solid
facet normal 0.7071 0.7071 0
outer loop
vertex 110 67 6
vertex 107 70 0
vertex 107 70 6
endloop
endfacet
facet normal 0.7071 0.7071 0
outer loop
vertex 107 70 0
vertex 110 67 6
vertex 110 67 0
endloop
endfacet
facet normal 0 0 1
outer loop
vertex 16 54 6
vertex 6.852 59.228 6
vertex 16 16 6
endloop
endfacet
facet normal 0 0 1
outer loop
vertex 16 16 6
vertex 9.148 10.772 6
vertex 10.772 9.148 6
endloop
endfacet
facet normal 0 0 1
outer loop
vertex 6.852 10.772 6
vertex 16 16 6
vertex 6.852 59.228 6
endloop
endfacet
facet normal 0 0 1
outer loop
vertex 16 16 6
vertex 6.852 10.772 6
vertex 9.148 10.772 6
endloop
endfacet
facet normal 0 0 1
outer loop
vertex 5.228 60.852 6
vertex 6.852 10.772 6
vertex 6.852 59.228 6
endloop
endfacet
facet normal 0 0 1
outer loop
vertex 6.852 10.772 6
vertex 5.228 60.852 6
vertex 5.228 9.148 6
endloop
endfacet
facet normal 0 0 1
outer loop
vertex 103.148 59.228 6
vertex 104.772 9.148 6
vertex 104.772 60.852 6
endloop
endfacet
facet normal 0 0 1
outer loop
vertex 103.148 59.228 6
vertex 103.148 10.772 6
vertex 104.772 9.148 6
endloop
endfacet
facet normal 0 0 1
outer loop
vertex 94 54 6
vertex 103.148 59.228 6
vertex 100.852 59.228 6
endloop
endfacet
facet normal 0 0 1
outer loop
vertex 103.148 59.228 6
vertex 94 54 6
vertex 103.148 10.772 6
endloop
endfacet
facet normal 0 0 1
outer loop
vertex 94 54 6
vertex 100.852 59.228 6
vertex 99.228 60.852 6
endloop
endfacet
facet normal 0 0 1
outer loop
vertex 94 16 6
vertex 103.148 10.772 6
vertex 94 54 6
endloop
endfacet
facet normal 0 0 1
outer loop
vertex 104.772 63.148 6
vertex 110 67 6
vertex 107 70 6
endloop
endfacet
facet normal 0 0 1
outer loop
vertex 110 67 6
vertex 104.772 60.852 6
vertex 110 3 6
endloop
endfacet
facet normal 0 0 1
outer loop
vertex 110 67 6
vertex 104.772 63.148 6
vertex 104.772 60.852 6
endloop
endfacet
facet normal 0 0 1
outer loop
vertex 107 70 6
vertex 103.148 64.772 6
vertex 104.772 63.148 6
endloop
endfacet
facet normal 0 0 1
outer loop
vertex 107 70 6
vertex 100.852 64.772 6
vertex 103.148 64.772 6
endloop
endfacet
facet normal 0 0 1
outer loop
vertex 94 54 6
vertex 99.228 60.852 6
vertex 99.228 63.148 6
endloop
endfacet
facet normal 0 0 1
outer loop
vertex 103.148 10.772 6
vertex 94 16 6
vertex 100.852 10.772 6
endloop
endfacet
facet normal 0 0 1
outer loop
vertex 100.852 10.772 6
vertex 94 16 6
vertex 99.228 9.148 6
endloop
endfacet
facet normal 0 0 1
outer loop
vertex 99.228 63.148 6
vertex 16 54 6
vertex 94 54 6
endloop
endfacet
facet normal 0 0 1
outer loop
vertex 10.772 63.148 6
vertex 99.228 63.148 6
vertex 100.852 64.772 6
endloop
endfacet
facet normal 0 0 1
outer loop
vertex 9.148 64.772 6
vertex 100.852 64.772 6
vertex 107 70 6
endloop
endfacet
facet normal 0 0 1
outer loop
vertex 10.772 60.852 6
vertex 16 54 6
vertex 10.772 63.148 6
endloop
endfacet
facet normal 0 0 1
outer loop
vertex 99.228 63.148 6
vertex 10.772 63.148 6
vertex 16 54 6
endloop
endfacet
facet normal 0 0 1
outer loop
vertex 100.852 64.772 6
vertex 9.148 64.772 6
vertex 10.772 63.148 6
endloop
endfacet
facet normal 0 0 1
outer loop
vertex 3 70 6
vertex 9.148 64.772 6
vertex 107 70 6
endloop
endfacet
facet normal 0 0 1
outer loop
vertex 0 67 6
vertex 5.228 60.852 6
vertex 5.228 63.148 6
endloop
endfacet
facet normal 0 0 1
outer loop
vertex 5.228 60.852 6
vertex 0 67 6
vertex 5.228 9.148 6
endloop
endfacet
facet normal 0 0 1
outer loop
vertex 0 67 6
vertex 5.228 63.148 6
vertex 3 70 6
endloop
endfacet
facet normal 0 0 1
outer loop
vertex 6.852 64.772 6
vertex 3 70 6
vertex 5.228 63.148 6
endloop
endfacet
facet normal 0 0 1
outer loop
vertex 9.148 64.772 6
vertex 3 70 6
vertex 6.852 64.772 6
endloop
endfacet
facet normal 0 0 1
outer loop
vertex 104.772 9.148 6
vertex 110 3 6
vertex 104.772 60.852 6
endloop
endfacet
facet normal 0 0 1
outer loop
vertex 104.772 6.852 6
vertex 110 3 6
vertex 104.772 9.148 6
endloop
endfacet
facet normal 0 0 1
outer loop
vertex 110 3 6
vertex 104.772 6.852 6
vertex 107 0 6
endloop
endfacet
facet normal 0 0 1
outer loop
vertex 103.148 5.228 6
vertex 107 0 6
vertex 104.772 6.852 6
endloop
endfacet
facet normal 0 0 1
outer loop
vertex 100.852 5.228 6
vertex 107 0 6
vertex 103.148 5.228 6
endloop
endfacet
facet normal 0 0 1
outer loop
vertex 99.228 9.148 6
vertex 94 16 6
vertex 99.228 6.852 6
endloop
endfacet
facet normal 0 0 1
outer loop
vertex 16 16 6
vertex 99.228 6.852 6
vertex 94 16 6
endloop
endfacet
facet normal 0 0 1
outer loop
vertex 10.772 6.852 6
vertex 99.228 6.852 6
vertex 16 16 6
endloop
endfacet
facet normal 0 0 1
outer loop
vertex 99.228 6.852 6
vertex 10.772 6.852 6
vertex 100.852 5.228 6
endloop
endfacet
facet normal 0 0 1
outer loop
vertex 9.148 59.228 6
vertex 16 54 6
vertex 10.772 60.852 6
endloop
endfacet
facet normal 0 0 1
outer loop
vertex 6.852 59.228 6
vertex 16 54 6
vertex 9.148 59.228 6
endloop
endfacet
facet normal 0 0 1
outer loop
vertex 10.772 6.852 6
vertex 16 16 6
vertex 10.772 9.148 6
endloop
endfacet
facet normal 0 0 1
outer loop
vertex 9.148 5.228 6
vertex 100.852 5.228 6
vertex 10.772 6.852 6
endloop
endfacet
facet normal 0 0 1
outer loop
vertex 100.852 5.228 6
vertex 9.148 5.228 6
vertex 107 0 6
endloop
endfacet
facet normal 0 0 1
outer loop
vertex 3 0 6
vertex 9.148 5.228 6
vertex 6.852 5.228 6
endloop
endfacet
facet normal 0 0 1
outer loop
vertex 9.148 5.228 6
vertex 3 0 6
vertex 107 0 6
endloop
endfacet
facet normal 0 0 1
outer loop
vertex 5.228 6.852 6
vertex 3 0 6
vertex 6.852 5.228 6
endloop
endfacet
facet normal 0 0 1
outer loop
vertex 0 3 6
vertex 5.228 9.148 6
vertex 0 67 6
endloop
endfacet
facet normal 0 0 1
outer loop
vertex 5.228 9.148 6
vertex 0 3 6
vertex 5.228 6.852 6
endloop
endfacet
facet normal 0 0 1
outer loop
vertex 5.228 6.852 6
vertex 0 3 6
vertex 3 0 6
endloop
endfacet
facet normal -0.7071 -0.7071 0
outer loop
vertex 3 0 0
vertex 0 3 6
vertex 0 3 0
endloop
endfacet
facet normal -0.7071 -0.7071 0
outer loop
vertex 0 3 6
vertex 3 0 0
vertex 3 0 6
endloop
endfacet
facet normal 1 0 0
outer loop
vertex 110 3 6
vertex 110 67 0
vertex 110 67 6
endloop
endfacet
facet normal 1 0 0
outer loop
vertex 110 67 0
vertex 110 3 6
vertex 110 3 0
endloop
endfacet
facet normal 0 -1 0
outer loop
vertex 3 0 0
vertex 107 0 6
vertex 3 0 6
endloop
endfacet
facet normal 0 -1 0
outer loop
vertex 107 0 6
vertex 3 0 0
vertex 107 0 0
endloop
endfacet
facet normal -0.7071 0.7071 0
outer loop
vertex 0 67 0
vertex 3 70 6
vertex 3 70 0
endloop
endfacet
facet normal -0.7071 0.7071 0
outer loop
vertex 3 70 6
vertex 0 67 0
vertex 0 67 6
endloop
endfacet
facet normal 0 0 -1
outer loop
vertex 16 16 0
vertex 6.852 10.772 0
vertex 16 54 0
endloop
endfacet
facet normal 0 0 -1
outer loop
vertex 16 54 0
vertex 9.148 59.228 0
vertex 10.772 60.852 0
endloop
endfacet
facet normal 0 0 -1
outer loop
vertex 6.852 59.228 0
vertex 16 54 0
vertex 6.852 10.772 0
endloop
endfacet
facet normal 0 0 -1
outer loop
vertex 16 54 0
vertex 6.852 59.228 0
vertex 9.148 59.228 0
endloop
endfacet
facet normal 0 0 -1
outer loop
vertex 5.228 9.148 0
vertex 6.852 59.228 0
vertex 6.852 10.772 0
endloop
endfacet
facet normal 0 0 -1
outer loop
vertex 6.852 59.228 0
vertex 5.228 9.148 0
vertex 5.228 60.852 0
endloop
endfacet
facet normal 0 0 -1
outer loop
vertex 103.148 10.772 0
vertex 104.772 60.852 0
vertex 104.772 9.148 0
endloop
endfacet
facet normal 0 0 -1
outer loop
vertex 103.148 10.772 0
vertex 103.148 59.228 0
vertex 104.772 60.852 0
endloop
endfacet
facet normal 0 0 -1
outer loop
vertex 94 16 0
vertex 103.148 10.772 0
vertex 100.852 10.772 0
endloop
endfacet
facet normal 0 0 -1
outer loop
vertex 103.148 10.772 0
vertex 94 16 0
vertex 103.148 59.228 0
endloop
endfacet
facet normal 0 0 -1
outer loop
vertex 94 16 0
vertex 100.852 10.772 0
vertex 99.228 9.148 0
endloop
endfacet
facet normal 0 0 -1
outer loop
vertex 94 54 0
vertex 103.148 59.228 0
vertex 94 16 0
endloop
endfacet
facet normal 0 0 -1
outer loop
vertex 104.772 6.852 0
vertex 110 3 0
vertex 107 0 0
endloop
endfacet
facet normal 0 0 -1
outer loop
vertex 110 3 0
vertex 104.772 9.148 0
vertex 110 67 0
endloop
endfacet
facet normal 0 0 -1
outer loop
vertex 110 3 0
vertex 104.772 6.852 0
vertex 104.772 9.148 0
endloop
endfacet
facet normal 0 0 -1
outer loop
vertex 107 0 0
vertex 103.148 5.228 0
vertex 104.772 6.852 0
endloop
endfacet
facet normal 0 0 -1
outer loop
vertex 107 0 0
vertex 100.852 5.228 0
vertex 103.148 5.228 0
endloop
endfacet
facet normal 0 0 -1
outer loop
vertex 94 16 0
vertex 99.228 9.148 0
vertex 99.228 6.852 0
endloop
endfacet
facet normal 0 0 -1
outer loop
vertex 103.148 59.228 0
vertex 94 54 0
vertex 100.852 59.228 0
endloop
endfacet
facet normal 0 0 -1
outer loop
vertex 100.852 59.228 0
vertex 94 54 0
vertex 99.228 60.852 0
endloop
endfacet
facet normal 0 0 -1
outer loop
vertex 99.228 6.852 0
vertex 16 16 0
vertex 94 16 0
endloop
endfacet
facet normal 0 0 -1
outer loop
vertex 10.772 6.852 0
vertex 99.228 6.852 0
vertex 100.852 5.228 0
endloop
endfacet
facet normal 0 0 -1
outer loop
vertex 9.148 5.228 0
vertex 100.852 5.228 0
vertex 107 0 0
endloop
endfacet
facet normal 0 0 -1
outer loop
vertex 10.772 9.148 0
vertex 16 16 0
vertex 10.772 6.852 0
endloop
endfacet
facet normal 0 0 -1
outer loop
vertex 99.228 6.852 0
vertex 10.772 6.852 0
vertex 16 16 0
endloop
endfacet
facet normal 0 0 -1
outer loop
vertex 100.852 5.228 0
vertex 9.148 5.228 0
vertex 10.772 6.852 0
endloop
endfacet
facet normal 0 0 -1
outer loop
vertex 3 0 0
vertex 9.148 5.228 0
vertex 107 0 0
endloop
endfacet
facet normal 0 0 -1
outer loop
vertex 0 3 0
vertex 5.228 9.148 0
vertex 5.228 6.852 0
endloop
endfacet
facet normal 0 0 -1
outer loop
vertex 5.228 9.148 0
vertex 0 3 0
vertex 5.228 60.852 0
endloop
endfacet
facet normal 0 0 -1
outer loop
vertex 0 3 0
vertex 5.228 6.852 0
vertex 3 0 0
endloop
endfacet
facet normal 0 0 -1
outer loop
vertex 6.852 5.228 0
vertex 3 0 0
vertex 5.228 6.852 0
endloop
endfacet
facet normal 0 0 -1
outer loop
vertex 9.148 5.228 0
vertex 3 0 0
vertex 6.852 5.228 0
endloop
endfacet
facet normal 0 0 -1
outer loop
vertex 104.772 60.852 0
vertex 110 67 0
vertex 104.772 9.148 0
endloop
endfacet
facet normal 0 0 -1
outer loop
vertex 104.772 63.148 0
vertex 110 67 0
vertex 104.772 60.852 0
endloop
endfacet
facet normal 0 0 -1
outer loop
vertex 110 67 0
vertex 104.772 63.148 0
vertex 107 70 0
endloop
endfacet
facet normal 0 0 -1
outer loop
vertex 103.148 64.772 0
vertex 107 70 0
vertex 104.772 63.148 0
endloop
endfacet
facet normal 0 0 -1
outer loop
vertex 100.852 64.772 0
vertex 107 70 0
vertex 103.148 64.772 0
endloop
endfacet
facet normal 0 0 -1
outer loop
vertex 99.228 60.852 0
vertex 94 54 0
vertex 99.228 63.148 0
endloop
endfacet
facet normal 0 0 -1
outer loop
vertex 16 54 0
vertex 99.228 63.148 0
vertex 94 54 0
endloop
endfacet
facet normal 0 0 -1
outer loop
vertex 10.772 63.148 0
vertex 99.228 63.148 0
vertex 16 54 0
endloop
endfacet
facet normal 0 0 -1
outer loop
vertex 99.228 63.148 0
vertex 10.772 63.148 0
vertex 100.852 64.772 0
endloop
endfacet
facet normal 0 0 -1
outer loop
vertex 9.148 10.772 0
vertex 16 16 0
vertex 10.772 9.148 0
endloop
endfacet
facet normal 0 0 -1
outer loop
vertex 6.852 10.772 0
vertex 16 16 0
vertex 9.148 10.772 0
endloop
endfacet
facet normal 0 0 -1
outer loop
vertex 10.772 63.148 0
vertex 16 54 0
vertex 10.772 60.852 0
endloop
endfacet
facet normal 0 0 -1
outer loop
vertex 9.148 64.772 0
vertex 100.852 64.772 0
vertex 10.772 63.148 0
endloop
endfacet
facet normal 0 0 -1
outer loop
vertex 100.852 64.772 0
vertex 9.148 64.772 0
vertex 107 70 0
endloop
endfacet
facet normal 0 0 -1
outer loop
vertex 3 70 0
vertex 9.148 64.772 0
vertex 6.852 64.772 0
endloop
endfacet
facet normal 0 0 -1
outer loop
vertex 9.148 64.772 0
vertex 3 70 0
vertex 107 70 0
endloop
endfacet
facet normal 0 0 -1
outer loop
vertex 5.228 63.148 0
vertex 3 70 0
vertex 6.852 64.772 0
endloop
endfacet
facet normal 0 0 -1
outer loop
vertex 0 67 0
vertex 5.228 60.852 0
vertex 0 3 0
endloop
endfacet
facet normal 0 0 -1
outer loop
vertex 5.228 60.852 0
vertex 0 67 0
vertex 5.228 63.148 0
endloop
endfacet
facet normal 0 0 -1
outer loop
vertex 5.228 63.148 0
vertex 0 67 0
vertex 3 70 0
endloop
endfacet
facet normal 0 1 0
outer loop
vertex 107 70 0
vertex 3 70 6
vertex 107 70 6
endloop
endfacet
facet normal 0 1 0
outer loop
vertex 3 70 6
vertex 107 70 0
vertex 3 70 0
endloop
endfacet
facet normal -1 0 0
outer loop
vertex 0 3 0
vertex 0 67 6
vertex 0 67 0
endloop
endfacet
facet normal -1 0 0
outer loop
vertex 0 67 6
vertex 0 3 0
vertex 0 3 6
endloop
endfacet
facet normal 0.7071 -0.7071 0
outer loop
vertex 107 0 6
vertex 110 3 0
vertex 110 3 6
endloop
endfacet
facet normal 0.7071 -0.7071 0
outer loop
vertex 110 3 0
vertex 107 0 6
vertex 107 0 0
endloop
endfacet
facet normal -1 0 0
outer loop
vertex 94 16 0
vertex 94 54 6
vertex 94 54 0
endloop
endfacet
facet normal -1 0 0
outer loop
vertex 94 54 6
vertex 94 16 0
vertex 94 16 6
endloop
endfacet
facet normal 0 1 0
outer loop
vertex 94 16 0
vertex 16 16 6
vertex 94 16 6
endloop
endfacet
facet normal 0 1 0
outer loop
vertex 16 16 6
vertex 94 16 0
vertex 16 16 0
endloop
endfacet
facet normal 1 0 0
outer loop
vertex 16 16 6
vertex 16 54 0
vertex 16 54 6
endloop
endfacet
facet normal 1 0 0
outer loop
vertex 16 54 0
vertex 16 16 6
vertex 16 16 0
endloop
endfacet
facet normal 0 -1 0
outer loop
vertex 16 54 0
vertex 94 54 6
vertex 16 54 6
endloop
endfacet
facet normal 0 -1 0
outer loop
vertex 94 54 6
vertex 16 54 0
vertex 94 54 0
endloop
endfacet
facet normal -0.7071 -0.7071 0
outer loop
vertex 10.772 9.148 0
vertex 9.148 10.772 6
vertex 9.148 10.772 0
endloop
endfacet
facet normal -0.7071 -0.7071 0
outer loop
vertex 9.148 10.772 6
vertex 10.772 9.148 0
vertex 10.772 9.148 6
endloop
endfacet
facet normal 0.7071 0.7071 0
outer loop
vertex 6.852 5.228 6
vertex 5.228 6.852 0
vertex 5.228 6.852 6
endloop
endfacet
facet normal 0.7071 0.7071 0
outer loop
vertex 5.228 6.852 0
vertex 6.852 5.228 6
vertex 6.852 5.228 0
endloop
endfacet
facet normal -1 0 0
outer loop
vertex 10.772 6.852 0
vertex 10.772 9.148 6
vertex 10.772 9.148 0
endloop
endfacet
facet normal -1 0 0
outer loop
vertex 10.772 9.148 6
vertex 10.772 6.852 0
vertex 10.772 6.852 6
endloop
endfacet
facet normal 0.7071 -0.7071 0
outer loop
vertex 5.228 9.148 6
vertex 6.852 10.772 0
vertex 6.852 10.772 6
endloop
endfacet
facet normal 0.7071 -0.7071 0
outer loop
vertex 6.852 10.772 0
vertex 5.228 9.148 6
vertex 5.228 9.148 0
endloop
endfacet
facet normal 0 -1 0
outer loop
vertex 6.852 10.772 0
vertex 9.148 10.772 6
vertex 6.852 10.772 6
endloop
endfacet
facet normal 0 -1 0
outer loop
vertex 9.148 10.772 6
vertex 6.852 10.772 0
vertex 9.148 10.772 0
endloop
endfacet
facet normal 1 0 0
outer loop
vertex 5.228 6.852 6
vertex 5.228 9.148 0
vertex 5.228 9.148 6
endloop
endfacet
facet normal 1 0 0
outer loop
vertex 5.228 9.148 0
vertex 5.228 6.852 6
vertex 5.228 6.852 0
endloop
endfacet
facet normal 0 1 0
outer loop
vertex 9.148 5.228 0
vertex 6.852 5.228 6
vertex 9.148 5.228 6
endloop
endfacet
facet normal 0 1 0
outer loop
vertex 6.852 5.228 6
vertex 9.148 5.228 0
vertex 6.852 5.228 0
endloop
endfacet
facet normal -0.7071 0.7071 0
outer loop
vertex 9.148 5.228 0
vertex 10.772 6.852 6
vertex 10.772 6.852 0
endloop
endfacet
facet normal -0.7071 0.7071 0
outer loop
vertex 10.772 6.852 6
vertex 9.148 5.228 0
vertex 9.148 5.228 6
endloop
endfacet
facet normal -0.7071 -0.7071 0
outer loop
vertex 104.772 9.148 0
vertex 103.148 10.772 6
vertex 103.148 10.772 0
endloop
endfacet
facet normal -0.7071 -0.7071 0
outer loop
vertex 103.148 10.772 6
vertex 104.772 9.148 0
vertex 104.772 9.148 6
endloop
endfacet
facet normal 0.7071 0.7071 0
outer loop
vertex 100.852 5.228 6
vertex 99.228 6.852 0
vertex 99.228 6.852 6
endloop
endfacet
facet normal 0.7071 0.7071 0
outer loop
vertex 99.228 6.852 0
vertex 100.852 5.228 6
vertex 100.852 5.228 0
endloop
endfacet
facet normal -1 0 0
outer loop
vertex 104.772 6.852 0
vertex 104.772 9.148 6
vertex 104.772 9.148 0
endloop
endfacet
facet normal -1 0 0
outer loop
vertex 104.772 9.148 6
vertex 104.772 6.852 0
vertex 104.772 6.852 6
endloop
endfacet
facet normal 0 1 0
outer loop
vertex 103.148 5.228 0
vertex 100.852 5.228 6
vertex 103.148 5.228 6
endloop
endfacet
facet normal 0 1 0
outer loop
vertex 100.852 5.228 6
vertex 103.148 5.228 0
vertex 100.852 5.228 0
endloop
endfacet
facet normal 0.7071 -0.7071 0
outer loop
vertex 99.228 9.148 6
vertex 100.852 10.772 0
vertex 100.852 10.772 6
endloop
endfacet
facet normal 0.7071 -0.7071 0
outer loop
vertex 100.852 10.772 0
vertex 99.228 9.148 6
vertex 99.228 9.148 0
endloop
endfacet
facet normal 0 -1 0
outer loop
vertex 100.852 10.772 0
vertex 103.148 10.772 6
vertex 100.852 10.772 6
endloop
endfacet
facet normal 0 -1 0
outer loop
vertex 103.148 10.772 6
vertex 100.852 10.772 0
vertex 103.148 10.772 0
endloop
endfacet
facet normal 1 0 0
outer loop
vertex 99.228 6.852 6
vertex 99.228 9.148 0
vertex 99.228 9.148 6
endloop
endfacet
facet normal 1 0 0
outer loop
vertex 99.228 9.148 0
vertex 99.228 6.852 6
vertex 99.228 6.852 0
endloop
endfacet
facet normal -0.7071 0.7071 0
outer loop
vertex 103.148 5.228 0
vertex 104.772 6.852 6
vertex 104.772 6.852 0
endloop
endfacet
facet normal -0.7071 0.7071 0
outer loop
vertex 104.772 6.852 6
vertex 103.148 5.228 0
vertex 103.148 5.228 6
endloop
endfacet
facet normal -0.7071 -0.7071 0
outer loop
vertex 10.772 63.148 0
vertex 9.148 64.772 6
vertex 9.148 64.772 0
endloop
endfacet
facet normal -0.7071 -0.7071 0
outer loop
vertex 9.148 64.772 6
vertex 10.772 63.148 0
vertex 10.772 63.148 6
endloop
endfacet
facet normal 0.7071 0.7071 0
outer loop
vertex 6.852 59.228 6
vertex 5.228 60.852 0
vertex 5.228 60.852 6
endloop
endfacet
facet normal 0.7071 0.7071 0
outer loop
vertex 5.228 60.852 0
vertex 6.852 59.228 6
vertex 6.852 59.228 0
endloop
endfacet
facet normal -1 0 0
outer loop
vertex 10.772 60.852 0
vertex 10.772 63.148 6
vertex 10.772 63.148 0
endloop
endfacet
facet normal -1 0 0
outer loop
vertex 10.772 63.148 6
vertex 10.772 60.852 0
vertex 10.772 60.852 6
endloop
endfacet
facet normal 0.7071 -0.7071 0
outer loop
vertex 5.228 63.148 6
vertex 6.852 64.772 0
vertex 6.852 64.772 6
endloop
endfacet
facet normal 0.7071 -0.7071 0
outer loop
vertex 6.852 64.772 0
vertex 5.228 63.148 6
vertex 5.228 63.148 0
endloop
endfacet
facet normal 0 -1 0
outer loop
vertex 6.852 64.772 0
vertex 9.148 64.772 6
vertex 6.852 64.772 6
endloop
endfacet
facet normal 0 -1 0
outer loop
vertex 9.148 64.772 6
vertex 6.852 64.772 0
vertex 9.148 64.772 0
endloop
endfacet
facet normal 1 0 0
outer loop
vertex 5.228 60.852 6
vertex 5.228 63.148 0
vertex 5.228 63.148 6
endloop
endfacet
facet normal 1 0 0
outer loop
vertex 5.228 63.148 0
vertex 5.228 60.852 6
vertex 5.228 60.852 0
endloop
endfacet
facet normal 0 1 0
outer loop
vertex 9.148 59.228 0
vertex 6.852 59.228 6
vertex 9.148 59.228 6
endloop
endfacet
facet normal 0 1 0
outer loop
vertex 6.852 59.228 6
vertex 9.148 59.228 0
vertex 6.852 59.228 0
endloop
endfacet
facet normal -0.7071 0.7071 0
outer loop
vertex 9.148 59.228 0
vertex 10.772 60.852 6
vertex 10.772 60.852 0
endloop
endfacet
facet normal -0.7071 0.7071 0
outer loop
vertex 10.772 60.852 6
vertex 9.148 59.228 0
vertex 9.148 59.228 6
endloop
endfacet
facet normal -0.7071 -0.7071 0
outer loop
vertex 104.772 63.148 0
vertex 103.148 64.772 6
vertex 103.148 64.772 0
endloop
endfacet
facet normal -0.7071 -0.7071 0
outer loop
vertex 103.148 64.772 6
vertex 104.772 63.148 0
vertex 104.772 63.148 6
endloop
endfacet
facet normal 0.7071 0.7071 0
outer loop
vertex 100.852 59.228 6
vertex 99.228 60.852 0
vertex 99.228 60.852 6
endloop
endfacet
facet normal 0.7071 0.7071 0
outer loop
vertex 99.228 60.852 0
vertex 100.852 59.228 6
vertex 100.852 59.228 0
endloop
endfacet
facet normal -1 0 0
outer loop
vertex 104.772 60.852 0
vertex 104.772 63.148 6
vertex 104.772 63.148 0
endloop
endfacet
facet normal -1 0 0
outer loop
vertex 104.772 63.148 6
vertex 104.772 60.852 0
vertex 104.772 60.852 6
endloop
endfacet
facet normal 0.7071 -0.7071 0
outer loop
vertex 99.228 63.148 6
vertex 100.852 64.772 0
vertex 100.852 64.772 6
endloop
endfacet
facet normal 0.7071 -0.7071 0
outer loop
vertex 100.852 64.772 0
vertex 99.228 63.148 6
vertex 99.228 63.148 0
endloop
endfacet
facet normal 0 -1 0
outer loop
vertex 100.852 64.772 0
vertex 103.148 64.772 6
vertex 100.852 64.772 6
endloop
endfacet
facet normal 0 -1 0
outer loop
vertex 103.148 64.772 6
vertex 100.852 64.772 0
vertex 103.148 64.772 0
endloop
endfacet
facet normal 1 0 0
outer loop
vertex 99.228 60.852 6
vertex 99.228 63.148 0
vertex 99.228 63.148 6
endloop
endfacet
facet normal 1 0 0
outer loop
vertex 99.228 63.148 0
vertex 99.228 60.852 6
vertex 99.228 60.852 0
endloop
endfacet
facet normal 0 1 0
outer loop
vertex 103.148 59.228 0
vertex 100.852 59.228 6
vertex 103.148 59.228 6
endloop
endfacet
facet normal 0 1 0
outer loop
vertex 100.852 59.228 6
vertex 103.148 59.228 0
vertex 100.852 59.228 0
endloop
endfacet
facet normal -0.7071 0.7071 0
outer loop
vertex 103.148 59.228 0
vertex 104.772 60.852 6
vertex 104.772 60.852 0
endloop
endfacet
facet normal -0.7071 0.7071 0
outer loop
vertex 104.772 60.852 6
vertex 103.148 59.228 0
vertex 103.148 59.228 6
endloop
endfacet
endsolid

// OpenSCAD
$fn = 32;

// ----------------------------------------------------------------------
// Frame plate: 110 x 70 frame, 16 mm rails
// ----------------------------------------------------------------------

// --- parameters (mm) ---
plate_l = 110;            // plate length, X
plate_w = 70;             // plate width, Y
plate_t = 6;              // plate thickness, Z (extrusion height)
corner_c = 3;             // corner chamfer
frame_bar = 16;           // frame rail width
bolt_r = 3;               // corner bolt window radius
bolt_inset = 8;           // bolt centre inset from the edges
fit_tol = 0.1;            // declared fit tolerance (prompt contract)
free_tol = 0.3;           // declared free tolerance (prompt contract)

win_l = plate_l - 2 * frame_bar;  // window length
win_w = plate_w - 2 * frame_bar;  // window width
bolt_d = 2 * bolt_r;  // corner hole diameter

profile = [[3, 0], [107, 0], [110, 3], [110, 67], [107, 70], [3, 70], [0, 67], [0, 3]];  // primary outline, 8 points, counter clockwise
void_1 = [[16, 16], [94, 16], [94, 54], [16, 54]];  // the window, 4 points
void_2 = [[10.772, 9.148], [9.148, 10.772], [6.852, 10.772], [5.228, 9.148], [5.228, 6.852], [6.852, 5.228], [9.148, 5.228], [10.772, 6.852]];  // corner bolt window, 8 points
void_3 = [[104.772, 9.148], [103.148, 10.772], [100.852, 10.772], [99.228, 9.148], [99.228, 6.852], [100.852, 5.228], [103.148, 5.228], [104.772, 6.852]];  // corner bolt window, 8 points
void_4 = [[10.772, 63.148], [9.148, 64.772], [6.852, 64.772], [5.228, 63.148], [5.228, 60.852], [6.852, 59.228], [9.148, 59.228], [10.772, 60.852]];  // corner bolt window, 8 points
void_5 = [[104.772, 63.148], [103.148, 64.772], [100.852, 64.772], [99.228, 63.148], [99.228, 60.852], [100.852, 59.228], [103.148, 59.228], [104.772, 60.852]];  // corner bolt window, 8 points

// --- the one profile operation ---
difference() {
  linear_extrude(height = plate_t) polygon(points = profile);
  translate([0, 0, -1])
    linear_extrude(height = plate_t + 2) polygon(points = void_1);
  translate([0, 0, -1])
    linear_extrude(height = plate_t + 2) polygon(points = void_2);
  translate([0, 0, -1])
    linear_extrude(height = plate_t + 2) polygon(points = void_3);
  translate([0, 0, -1])
    linear_extrude(height = plate_t + 2) polygon(points = void_4);
  translate([0, 0, -1])
    linear_extrude(height = plate_t + 2) polygon(points = void_5);
}
